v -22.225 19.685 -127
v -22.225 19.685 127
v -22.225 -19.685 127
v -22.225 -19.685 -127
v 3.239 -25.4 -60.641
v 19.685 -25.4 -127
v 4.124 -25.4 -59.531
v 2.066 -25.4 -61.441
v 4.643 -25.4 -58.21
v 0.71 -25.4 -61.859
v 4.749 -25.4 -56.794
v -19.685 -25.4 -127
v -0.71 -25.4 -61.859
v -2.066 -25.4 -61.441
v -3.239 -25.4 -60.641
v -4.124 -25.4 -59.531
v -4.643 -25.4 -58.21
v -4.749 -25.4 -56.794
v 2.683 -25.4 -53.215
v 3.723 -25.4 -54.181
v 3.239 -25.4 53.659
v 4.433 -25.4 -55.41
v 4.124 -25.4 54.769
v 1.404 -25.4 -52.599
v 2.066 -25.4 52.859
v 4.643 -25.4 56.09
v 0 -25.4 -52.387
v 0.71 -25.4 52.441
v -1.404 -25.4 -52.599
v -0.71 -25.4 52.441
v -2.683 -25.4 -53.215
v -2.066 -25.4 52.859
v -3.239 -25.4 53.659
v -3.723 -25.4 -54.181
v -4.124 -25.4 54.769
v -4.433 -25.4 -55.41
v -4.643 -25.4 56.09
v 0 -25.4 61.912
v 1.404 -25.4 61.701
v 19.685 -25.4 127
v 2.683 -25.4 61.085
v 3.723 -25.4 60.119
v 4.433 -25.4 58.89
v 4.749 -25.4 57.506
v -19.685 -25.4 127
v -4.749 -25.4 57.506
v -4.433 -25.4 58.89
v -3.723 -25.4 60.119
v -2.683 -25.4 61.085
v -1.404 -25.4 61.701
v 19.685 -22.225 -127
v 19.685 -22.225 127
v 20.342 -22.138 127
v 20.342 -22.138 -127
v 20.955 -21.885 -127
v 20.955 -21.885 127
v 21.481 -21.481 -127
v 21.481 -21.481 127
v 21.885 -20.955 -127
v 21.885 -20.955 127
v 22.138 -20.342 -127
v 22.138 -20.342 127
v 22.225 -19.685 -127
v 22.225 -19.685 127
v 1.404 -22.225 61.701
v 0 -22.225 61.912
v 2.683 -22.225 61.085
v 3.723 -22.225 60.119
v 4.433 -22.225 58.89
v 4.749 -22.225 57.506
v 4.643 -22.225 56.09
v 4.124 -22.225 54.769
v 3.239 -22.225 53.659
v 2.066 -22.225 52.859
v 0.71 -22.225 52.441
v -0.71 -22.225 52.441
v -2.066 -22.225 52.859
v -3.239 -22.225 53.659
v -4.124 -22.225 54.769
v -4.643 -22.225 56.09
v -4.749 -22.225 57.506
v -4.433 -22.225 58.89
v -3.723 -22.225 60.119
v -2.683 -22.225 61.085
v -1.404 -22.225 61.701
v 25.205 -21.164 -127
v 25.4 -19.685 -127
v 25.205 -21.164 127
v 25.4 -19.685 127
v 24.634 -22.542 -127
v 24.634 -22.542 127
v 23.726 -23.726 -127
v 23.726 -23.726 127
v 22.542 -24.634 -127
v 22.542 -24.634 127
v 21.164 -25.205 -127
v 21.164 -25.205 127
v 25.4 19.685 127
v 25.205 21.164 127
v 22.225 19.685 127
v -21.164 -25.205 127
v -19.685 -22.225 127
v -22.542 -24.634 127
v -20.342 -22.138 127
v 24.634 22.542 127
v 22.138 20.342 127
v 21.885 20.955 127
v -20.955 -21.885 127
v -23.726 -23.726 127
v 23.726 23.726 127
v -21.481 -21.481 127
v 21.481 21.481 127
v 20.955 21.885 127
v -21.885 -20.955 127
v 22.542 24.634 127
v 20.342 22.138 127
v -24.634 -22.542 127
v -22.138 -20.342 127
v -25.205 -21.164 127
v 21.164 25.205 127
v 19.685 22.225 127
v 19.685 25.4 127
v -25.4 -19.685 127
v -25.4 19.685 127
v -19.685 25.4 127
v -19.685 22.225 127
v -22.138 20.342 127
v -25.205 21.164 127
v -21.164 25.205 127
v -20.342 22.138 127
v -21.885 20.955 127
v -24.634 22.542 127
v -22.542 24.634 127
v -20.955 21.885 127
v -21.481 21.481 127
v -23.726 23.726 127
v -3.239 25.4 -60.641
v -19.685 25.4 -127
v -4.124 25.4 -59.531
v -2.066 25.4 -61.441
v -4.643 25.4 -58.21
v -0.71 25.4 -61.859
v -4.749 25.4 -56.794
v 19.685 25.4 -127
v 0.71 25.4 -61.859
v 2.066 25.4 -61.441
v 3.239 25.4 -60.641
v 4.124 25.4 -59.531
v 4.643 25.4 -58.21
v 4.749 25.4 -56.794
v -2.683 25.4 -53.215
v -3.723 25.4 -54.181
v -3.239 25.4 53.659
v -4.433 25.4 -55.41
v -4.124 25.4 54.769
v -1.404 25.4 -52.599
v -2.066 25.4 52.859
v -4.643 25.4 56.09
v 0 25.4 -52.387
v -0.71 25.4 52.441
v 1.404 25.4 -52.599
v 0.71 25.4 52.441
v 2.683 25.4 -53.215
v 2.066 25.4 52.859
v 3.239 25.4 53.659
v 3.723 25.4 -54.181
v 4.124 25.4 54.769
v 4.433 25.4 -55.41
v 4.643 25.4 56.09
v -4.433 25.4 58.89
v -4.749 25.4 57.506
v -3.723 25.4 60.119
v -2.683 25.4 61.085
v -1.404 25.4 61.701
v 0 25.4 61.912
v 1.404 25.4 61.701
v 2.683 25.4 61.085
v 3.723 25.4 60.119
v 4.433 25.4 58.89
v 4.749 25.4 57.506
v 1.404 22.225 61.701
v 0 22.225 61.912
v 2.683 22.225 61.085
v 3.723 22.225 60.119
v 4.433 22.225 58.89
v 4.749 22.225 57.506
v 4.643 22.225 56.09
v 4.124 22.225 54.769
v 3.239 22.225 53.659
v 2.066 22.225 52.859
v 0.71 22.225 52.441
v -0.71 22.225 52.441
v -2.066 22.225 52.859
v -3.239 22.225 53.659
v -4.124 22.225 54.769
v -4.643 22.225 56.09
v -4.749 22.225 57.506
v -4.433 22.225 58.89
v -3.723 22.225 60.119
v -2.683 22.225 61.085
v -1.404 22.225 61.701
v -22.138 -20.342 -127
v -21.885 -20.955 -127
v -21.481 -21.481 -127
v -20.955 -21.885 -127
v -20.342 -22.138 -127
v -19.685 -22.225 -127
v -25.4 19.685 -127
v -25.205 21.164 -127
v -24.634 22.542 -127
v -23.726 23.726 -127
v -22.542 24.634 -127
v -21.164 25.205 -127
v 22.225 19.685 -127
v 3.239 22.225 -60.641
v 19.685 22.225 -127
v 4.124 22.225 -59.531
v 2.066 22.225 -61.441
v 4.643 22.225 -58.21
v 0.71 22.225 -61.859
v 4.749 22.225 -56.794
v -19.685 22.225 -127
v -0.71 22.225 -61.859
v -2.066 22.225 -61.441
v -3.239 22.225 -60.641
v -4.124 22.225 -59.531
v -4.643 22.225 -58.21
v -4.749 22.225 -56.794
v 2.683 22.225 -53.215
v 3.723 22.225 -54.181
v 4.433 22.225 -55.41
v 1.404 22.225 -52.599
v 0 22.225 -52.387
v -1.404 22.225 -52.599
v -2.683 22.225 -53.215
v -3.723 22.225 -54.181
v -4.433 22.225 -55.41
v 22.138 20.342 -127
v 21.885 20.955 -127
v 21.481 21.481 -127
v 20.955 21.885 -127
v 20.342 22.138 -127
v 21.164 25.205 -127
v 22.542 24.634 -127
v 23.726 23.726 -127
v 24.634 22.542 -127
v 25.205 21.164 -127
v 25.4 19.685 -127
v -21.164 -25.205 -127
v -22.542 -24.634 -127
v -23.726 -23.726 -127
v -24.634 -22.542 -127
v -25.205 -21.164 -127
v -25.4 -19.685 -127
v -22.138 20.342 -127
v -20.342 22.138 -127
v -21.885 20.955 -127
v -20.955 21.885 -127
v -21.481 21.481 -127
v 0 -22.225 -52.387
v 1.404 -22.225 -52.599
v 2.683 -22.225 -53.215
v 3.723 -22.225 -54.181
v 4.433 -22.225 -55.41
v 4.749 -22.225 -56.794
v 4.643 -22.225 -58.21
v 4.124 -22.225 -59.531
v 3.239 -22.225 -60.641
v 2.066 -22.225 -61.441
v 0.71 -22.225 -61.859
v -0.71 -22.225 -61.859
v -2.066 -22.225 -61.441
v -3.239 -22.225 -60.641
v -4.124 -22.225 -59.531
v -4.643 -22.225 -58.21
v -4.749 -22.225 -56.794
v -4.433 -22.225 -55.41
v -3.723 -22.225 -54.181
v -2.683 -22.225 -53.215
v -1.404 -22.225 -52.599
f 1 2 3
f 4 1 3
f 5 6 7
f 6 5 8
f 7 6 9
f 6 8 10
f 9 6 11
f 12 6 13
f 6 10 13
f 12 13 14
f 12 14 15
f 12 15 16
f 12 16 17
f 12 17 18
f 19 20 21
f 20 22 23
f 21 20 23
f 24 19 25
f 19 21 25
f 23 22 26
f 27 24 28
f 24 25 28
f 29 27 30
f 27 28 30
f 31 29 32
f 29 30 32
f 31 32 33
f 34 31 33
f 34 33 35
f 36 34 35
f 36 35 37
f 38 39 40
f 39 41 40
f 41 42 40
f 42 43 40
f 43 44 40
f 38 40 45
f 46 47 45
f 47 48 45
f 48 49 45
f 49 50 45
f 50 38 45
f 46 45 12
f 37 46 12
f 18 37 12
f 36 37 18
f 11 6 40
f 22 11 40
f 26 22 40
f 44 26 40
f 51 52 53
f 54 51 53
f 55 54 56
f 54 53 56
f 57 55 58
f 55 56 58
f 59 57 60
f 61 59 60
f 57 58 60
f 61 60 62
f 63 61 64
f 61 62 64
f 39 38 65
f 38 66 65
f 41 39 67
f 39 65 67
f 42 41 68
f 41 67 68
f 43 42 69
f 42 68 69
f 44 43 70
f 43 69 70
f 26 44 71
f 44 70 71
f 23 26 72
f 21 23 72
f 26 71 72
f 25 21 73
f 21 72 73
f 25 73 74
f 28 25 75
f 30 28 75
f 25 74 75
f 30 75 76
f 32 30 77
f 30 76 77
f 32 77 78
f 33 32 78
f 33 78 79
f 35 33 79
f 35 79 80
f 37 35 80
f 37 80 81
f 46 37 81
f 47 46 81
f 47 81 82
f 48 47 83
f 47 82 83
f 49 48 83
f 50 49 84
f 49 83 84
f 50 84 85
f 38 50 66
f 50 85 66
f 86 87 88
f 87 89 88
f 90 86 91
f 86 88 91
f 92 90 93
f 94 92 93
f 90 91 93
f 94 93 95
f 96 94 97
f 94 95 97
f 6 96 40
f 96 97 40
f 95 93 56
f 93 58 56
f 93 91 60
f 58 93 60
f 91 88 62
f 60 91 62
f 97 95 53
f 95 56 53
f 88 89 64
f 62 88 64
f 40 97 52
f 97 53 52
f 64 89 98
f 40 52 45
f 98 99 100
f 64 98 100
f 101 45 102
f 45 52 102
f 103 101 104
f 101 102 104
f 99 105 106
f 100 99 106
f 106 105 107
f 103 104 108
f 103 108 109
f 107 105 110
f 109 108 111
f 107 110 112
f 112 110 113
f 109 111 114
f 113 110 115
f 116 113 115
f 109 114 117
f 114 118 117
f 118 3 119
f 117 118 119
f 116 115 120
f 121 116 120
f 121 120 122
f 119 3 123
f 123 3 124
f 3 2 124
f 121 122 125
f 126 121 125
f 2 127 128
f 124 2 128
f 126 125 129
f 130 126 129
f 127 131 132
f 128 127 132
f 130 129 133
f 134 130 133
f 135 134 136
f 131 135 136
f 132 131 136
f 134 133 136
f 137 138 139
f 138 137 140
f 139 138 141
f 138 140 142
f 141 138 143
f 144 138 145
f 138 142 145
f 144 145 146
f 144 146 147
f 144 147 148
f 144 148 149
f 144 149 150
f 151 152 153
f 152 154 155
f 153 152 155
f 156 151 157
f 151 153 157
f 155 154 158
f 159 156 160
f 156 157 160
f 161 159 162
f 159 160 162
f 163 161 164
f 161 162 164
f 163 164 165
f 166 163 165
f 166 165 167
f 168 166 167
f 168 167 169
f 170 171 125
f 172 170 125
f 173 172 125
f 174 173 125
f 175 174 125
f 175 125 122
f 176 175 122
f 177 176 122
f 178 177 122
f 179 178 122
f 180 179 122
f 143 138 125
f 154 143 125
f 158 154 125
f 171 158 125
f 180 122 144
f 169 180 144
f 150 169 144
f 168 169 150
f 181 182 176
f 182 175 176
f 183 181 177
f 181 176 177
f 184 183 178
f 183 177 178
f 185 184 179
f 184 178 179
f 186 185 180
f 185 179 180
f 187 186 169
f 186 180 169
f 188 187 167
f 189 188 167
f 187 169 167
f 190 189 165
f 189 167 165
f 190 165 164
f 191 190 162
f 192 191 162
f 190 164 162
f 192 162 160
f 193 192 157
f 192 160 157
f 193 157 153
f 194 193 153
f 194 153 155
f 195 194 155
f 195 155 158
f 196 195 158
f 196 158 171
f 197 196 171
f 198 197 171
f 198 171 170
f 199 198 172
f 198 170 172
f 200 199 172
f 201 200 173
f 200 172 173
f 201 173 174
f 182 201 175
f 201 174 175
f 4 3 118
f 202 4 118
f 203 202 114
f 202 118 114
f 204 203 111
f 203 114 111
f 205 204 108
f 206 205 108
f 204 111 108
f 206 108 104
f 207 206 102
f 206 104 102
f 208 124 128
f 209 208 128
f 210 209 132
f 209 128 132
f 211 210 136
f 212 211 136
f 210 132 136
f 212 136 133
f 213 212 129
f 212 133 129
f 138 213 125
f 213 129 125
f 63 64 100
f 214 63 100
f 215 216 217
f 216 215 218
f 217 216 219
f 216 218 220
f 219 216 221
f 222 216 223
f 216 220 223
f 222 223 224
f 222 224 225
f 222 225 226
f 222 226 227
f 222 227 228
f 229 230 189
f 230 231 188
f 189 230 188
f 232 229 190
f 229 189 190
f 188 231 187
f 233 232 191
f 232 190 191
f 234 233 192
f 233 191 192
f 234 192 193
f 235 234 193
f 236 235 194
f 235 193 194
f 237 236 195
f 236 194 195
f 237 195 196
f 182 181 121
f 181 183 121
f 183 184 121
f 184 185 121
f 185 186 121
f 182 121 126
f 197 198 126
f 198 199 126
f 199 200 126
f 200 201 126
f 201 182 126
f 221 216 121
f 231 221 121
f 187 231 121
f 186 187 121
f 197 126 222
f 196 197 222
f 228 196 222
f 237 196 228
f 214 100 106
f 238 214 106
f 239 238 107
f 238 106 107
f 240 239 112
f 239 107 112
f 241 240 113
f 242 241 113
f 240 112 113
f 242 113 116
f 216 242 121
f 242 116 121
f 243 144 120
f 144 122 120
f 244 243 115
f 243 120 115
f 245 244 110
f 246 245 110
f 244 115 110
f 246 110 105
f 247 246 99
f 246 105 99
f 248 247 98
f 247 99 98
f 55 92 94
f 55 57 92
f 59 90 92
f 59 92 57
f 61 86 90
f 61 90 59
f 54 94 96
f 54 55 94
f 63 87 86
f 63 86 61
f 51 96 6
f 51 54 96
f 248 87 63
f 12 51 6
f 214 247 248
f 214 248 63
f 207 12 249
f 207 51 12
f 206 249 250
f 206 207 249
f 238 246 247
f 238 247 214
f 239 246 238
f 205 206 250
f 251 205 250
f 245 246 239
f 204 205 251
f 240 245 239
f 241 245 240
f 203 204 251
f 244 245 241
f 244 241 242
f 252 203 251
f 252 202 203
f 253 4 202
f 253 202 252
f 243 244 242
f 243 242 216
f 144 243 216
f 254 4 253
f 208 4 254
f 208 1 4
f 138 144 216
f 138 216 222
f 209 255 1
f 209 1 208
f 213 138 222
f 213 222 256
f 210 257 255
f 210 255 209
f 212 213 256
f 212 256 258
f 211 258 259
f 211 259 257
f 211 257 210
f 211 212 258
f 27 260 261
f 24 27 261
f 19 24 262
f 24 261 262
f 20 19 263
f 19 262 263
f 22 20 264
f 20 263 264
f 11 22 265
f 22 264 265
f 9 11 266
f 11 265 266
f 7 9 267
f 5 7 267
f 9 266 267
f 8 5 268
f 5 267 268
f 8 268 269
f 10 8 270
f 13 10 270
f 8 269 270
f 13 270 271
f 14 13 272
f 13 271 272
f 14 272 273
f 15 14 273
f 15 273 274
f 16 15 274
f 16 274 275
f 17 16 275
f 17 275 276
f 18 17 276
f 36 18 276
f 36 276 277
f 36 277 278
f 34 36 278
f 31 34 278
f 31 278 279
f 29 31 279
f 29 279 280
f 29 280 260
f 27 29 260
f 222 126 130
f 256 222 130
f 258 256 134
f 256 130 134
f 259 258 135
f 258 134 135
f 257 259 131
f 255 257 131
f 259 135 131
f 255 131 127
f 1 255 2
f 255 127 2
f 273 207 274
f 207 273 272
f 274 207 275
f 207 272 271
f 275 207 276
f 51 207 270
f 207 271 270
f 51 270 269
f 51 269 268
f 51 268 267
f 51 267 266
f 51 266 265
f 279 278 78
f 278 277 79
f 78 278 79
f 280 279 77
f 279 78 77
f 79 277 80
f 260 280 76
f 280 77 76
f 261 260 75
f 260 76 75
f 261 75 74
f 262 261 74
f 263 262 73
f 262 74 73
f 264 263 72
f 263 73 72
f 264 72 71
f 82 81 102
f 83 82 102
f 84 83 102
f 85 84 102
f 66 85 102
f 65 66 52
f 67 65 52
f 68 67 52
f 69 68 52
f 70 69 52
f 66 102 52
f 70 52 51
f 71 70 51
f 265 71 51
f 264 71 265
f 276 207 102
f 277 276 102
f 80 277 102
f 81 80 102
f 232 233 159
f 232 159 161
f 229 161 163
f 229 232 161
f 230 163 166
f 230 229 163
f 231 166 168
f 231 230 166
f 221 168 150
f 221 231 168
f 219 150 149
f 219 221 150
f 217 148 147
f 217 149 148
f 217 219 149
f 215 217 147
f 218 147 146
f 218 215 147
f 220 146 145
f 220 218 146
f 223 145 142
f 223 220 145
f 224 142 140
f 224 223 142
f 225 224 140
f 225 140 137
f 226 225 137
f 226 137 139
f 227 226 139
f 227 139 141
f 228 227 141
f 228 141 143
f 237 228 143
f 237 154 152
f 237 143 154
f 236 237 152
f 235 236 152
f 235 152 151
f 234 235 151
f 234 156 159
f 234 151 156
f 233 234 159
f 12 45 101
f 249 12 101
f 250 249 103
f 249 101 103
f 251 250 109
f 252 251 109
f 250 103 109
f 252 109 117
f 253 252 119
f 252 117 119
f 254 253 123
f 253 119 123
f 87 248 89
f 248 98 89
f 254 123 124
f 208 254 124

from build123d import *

# Parameters (mm, degrees)
BOSS_EXTRUDE1_DEPTH = 127
SKETCH2_R           = 4.7625
CUT_EXTRUDE1_DEPTH  = 38.1


with BuildPart() as part:
    # Sketch1 → Boss-Extrude1 (new, symmetric)
    with BuildSketch(Plane.XY):
        with BuildLine():
            Line((-19.685, 25.4), (19.685, 25.4))
            ThreePointArc((19.685, 25.4), (23.726115254, 23.726115254), (25.4, 19.685))
            Line((25.4, 19.685), (25.4, -19.685))
            ThreePointArc((25.4, -19.685), (23.726115254, -23.726115254), (19.685, -25.4))
            Line((19.685, -25.4), (-19.685, -25.4))
            ThreePointArc((-19.685, -25.4), (-23.726115254, -23.726115254), (-25.4, -19.685))
            Line((-25.4, -19.685), (-25.4, 19.685))
            ThreePointArc((-25.4, 19.685), (-23.726115254, 23.726115254), (-19.685, 25.4))
        make_face()
        with BuildLine():
            Line((-19.685, -22.225), (19.685, -22.225))
            ThreePointArc((19.685, -22.225), (21.481051224, -21.481051224), (22.225, -19.685))
            Line((22.225, -19.685), (22.225, 19.685))
            ThreePointArc((22.225, 19.685), (21.481051224, 21.481051224), (19.685, 22.225))
            Line((19.685, 22.225), (-19.685, 22.225))
            ThreePointArc((-19.685, 22.225), (-21.481051224, 21.481051224), (-22.225, 19.685))
            Line((-22.225, 19.685), (-22.225, -19.685))
            ThreePointArc((-22.225, -19.685), (-21.481051224, -21.481051224), (-19.685, -22.225))
        make_face(mode=Mode.SUBTRACT)
    extrude(amount=BOSS_EXTRUDE1_DEPTH, both=True)

    # Sketch2 → Cut-Extrude1 (cut, symmetric)
    with BuildSketch(Plane(origin=(0, 0, 0), x_dir=(1, 0, 0), z_dir=(0, 1, 0))):
        with Locations(Location((0, 57.15, 0), (0, 0, 270))):
            Circle(SKETCH2_R)
        with Locations(Location((0, -57.15, 0), (0, 0, 270))):
            Circle(SKETCH2_R)
    extrude(amount=CUT_EXTRUDE1_DEPTH, both=True, mode=Mode.SUBTRACT)


solid = part.part
